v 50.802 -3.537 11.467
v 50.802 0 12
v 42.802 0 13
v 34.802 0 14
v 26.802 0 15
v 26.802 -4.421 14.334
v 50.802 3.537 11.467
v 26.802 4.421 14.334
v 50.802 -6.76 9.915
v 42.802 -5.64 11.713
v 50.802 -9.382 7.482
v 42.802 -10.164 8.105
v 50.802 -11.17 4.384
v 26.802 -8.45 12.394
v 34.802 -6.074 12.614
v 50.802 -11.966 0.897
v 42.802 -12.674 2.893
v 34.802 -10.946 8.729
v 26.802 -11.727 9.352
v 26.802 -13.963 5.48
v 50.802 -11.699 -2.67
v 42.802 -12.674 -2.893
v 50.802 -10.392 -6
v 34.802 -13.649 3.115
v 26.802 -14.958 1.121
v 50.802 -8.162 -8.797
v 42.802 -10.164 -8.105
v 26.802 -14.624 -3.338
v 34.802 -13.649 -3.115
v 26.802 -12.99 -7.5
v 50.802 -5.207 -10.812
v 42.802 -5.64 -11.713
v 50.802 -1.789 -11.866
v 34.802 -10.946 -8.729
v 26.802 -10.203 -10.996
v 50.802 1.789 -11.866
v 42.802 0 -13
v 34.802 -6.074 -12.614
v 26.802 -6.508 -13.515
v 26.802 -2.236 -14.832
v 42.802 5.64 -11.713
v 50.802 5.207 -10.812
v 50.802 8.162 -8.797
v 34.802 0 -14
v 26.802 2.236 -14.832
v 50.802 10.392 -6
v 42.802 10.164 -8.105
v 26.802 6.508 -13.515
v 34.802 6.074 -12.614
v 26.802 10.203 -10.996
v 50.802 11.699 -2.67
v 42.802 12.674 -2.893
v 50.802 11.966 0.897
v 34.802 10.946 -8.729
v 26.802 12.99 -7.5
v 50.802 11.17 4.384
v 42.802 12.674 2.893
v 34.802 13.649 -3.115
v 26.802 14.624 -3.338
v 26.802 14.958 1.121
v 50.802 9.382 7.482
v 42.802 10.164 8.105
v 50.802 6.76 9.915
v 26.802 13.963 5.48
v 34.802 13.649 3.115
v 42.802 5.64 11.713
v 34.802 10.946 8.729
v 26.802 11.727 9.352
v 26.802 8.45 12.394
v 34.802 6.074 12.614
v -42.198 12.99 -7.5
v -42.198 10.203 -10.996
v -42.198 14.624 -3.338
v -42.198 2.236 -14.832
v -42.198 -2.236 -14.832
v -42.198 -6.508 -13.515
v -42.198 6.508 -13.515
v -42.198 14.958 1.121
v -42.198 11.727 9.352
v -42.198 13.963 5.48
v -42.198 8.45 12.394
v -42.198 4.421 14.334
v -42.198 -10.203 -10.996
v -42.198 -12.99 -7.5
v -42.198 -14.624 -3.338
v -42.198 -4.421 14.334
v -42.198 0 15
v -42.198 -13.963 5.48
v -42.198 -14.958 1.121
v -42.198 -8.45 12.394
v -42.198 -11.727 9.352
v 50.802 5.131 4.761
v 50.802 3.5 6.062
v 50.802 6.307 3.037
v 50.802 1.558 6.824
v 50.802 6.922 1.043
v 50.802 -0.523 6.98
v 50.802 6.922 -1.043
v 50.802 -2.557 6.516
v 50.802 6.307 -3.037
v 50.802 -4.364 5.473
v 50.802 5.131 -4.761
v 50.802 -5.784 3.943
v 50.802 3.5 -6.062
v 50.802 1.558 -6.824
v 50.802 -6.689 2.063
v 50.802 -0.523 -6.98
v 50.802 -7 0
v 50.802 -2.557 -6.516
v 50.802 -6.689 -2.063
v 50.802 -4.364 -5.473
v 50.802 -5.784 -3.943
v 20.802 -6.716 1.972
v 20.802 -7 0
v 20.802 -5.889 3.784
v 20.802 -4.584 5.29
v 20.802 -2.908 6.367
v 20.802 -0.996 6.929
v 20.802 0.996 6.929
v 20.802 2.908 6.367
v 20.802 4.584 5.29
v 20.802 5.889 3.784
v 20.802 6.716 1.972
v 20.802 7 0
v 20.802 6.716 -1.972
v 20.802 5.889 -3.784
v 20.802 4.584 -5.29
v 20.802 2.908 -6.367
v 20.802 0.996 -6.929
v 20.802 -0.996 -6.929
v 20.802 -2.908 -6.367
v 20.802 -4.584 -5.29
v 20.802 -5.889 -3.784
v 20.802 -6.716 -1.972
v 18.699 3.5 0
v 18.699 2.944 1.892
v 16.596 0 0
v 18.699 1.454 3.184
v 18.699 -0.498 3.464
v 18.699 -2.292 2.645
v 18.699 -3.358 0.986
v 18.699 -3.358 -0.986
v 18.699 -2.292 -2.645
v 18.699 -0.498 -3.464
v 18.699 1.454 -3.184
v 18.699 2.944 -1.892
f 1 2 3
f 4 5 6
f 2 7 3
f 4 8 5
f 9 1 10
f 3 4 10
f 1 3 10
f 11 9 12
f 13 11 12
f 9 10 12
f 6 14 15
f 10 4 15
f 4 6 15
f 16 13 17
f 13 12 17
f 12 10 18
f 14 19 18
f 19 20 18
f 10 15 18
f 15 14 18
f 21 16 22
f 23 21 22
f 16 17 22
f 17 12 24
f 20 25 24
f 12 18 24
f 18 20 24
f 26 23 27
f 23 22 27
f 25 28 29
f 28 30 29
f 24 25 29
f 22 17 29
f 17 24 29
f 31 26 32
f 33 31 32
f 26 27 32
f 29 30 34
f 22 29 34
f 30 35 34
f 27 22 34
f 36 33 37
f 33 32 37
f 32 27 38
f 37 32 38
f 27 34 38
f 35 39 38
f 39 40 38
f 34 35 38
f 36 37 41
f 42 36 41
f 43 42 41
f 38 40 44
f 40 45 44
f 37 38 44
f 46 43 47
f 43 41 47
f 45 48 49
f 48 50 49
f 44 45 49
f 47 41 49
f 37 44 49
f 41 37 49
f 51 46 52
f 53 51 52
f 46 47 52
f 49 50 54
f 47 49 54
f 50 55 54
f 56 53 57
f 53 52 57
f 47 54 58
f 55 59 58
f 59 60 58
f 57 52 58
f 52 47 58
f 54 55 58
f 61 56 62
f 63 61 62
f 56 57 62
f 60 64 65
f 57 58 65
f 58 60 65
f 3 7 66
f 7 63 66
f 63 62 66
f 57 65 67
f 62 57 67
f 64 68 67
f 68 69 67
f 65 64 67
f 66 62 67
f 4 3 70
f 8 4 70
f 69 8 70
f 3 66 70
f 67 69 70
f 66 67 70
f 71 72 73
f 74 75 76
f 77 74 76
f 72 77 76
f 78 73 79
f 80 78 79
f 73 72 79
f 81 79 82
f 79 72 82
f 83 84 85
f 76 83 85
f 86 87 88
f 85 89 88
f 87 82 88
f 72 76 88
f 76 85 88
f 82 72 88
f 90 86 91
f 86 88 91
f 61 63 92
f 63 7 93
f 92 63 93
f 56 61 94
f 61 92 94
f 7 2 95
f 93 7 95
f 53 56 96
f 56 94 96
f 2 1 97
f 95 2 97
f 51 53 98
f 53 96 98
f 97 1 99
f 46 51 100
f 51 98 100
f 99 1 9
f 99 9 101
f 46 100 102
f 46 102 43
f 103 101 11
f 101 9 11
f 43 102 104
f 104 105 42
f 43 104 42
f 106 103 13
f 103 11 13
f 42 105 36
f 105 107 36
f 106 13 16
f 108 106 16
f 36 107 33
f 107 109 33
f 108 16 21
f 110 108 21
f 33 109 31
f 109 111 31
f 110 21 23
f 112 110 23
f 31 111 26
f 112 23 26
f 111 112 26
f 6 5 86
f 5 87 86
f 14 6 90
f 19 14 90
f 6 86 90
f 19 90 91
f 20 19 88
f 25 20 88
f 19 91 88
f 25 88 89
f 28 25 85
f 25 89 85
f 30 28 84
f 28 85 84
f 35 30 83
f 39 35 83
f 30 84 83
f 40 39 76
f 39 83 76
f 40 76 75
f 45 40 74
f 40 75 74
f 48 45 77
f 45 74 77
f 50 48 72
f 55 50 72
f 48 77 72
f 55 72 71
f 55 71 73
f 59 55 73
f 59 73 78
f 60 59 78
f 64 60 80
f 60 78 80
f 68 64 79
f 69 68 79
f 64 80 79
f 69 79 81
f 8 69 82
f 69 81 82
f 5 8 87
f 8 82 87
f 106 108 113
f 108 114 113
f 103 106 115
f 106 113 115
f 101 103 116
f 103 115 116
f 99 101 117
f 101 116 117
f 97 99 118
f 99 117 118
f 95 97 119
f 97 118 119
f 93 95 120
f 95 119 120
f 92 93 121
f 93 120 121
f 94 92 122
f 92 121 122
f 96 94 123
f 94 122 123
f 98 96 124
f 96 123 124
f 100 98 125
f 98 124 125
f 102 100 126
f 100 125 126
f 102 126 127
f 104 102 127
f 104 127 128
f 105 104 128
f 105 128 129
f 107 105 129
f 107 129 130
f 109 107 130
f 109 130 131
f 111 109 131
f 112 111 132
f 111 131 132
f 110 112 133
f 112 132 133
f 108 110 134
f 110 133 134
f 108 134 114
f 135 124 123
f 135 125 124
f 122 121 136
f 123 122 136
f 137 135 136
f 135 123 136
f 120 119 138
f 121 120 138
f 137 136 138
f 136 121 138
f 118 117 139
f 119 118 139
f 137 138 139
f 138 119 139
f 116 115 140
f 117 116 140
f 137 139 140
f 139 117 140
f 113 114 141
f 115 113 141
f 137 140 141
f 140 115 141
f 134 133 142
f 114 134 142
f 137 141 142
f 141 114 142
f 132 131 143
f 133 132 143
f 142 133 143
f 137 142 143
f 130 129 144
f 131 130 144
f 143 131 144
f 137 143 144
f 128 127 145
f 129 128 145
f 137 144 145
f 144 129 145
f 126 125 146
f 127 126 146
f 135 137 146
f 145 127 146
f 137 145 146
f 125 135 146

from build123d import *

# Parameters (mm, degrees)
F2_R     = 7
F3_DEPTH = 30
F5_D     = 14
F5_DEPTH = 30
F5_TIP   = 4.2060243332


with BuildPart() as f1:
    # F0 (on Front) → F1 (revolve)
    with BuildSketch(Plane.XZ):
        Polygon((-42.1976023009, 15), (-42.1976023009, 0), (-20.7868143916, 0), (26.8023976991, 0), (26.8023976991, 15), align=None)
        Polygon((26.8023976991, 15), (26.8023976991, 0), (50.8023976991, 0), (50.8023976991, 12), align=None)
    revolve(axis=Axis((4.7784452844, 0, 0), (1, 0, 0)))

    # F2 (on face) → F3 (join)
    with BuildSketch(Plane.YZ.offset(50.8023976991)):
        Circle(F2_R)
    extrude(amount=-F3_DEPTH)

    # F5
    with Locations(Plane.YZ.offset(50.8023976991)):
        with Locations((0, 0)):
            Hole(F5_D / 2, depth=F5_DEPTH)
            with Locations((0, 0, -(F5_DEPTH + F5_TIP / 2))):  # 118° drill point
                Cone(0, F5_D / 2, F5_TIP, mode=Mode.SUBTRACT)


solid = f1.part
